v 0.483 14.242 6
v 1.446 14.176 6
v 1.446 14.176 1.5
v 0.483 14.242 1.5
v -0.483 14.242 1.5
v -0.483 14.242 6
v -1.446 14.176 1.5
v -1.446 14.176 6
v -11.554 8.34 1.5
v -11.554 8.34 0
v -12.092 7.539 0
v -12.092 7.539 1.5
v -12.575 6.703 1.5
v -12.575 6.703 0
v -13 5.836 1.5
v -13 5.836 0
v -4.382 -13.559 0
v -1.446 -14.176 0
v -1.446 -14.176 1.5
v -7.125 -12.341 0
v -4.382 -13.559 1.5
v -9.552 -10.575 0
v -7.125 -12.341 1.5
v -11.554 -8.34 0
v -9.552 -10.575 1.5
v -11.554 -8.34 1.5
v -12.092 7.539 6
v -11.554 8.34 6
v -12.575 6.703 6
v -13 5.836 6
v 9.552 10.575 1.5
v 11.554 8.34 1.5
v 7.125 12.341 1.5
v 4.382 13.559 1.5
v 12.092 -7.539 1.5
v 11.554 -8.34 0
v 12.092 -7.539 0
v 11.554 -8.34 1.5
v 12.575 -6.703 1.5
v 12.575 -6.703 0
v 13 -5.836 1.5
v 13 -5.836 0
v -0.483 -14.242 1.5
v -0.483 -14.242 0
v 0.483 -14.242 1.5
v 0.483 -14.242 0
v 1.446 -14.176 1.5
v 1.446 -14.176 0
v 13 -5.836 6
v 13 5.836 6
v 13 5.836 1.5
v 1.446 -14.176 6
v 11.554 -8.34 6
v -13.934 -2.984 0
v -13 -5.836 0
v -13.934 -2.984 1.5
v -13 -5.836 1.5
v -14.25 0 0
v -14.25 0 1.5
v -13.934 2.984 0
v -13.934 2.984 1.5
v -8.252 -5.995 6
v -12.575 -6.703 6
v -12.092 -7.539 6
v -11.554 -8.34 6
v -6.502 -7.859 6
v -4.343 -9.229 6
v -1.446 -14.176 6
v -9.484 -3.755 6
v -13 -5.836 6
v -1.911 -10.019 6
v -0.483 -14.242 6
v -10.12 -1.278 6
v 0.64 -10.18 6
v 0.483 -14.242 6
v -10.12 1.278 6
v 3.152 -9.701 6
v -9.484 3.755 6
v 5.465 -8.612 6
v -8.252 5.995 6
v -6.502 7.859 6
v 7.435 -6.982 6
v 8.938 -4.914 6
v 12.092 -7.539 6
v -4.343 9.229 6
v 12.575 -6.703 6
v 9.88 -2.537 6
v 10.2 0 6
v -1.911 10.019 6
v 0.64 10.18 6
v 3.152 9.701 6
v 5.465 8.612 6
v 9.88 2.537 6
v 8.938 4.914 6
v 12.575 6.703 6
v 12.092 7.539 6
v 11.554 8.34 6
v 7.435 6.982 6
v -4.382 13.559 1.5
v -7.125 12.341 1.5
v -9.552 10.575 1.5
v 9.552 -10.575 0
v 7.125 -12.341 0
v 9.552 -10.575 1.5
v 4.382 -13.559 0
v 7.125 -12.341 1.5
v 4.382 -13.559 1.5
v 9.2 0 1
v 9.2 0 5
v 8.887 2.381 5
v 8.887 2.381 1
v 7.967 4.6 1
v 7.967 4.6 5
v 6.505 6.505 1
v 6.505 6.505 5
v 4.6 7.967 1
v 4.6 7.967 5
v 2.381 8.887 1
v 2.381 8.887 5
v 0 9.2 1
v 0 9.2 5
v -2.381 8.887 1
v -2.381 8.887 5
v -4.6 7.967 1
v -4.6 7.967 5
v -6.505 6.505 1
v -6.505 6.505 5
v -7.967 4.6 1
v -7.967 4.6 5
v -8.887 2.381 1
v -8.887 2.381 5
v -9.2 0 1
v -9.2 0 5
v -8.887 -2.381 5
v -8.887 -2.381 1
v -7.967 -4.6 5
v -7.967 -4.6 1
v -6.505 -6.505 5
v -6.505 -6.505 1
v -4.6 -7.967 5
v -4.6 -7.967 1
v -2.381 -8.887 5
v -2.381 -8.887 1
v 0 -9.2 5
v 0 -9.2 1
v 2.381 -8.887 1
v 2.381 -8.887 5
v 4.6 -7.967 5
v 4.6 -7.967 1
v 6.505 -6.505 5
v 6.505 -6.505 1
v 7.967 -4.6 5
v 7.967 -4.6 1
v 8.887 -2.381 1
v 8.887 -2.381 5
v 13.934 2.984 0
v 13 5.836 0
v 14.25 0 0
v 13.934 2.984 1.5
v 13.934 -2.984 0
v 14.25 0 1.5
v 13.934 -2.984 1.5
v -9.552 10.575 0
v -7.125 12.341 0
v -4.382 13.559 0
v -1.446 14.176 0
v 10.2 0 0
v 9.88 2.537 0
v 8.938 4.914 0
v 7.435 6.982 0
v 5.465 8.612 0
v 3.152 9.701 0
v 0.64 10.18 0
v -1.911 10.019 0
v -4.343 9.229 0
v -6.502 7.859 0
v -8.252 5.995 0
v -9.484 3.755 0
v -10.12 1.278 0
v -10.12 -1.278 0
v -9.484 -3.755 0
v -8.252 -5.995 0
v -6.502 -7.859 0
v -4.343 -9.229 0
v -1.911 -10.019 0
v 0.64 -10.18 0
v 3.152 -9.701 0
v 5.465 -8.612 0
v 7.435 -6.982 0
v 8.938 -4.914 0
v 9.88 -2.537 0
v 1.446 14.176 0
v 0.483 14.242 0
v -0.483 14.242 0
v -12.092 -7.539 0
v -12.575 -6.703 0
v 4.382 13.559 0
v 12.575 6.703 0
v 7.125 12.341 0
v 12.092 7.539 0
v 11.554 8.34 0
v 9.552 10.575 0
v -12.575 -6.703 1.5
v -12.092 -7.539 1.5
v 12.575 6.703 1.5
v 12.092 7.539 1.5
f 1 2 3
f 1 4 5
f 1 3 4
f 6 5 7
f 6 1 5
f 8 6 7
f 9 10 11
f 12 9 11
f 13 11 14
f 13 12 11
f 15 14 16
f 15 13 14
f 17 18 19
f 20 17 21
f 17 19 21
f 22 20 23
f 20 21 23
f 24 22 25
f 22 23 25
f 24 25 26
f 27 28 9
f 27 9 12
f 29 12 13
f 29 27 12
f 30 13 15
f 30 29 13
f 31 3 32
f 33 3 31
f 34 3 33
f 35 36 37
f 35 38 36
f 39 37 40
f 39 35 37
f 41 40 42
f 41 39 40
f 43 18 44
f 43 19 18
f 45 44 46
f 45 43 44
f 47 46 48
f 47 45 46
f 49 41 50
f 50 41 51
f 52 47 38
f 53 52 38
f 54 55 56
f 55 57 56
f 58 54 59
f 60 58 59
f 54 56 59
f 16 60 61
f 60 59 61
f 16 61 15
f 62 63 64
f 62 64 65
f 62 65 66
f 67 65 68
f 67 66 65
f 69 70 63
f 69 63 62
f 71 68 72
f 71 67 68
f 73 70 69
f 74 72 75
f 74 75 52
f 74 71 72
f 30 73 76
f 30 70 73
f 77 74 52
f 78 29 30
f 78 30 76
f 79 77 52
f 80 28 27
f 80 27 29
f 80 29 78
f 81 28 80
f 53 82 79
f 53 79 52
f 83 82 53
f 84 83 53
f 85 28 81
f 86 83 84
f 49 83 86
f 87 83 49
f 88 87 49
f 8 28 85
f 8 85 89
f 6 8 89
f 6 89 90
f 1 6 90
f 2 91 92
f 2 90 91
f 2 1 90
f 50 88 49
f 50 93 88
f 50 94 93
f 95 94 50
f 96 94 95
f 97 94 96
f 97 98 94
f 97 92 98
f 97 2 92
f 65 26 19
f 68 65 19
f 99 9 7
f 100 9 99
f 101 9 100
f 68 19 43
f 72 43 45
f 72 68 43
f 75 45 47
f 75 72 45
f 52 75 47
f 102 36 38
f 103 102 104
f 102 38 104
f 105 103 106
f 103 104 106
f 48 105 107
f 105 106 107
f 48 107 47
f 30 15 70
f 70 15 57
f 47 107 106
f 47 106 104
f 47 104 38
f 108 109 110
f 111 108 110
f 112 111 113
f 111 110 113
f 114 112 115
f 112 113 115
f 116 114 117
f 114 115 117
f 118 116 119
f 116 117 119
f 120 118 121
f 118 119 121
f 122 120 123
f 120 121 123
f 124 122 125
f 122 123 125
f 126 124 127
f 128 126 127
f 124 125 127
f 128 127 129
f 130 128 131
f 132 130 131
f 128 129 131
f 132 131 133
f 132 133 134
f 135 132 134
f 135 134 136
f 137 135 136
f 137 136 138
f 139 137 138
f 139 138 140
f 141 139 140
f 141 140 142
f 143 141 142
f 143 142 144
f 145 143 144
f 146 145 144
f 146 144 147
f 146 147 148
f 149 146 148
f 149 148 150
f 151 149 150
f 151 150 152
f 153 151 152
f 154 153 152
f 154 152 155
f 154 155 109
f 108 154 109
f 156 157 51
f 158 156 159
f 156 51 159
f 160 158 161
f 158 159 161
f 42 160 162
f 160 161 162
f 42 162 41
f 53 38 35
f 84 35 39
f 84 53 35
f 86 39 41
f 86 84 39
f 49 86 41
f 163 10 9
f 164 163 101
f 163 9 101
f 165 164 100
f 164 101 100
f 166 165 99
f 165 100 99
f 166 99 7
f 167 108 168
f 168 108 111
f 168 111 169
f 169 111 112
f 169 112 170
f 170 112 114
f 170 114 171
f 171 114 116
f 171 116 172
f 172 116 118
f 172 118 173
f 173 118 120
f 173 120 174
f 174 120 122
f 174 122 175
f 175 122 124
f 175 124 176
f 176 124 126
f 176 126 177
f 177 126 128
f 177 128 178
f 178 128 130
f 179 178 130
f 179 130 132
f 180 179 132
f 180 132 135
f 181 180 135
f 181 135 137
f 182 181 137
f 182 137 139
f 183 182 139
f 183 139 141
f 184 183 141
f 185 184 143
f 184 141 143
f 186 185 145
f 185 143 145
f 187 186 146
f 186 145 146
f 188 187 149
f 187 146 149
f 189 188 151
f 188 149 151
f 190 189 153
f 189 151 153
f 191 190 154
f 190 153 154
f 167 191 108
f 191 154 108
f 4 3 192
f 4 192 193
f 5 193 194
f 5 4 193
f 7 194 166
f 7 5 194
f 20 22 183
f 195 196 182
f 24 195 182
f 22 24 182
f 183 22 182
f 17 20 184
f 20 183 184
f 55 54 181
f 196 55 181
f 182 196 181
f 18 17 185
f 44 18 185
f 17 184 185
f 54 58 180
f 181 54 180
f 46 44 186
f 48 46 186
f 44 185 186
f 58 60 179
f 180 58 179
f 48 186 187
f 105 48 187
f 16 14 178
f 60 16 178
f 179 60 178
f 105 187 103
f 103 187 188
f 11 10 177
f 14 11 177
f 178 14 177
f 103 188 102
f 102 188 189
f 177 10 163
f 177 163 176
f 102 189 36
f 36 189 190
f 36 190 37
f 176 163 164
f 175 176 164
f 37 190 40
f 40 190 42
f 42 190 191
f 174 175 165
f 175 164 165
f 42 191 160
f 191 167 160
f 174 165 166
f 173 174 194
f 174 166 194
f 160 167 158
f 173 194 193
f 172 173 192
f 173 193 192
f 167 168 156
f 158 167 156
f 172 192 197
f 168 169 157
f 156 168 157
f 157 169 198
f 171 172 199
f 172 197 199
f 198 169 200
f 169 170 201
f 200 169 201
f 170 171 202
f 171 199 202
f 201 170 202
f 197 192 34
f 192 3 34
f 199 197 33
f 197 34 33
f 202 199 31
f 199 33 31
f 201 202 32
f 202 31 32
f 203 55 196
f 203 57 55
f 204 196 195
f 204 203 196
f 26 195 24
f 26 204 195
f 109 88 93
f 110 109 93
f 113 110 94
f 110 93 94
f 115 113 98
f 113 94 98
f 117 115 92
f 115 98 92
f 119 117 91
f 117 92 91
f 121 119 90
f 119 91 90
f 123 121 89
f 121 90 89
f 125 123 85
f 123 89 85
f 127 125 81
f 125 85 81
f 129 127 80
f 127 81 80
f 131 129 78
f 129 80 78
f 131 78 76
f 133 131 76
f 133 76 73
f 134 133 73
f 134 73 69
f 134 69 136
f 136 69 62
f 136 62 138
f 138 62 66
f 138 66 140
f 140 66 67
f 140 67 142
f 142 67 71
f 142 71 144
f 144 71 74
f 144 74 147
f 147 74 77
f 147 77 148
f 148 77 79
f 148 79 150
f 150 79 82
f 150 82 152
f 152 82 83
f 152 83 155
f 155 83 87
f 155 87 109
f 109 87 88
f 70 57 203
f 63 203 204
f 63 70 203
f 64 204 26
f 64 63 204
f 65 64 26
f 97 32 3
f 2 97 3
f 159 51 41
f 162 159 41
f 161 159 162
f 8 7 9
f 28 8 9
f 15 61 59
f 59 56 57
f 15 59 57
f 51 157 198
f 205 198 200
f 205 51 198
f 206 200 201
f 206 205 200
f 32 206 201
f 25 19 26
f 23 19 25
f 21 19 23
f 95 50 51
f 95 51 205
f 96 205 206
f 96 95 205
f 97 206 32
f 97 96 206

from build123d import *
from build123d.topology import SkipClean

# Parameters (mm, degrees)
EXTRUDE_1_DEPTH     = 6
SKETCH_2_R          = 15.011106999
SKETCH_2_R_2        = 14.25
CUT_EXTRUDE_1_DEPTH = 21.744477177
EXTRUDE_START       = -1.5
SKETCH_4_R          = 14.25
EXTRUDE_3_DEPTH     = 1.5
SKETCH_5_R          = 9.2
CUT_EXTRUDE_2_DEPTH = 22.026768653
CHAMFER_1_SIZE      = 1


with BuildPart() as part:
    # Эскиз1 → Вытянуть1 (new body)
    with BuildSketch(Plane.XY):
        Polygon((0, 15.011106999), (-13, 7.505553499), (-13, -7.505553499), (0, -15.011106999), (13, -7.505553499), (13, 7.505553499), align=None)
    extrude(amount=EXTRUDE_1_DEPTH)

    # Эскиз2 → Вырез-Вытянуть1 (cut, through all)
    with BuildSketch(Plane.XY.offset(6)):
        Circle(SKETCH_2_R)
        Circle(SKETCH_2_R_2, mode=Mode.SUBTRACT)
    extrude(amount=-CUT_EXTRUDE_1_DEPTH, mode=Mode.SUBTRACT)

    # Эскиз4 → Вытянуть3 (add)
    with SkipClean():  # the faces are left unmerged after this step: merging them gives an invalid solid
        with BuildSketch(Plane(origin=(0, 0, 0), x_dir=(-1, 0, 0), z_dir=(0, 0, -1)).offset(EXTRUDE_START)):
            Circle(SKETCH_4_R)
        extrude(amount=EXTRUDE_3_DEPTH)
    add(part.part.scale(1), mode=Mode.REPLACE)  # the faces are merged on a copy

    # Эскиз5 → Вырез-Вытянуть2 (cut, through all)
    with BuildSketch(Plane.XY.offset(6)):
        Circle(SKETCH_5_R)
    extrude(amount=-CUT_EXTRUDE_2_DEPTH, mode=Mode.SUBTRACT)

    # Фаска1
    chamfer_1_edges = [part.edges().sort_by_distance(p)[0] for p in [
        (-9.2, 0, 0),
        (-9.2, 0, 6),
    ]]
    chamfer(chamfer_1_edges, length=CHAMFER_1_SIZE)


solid = part.part
